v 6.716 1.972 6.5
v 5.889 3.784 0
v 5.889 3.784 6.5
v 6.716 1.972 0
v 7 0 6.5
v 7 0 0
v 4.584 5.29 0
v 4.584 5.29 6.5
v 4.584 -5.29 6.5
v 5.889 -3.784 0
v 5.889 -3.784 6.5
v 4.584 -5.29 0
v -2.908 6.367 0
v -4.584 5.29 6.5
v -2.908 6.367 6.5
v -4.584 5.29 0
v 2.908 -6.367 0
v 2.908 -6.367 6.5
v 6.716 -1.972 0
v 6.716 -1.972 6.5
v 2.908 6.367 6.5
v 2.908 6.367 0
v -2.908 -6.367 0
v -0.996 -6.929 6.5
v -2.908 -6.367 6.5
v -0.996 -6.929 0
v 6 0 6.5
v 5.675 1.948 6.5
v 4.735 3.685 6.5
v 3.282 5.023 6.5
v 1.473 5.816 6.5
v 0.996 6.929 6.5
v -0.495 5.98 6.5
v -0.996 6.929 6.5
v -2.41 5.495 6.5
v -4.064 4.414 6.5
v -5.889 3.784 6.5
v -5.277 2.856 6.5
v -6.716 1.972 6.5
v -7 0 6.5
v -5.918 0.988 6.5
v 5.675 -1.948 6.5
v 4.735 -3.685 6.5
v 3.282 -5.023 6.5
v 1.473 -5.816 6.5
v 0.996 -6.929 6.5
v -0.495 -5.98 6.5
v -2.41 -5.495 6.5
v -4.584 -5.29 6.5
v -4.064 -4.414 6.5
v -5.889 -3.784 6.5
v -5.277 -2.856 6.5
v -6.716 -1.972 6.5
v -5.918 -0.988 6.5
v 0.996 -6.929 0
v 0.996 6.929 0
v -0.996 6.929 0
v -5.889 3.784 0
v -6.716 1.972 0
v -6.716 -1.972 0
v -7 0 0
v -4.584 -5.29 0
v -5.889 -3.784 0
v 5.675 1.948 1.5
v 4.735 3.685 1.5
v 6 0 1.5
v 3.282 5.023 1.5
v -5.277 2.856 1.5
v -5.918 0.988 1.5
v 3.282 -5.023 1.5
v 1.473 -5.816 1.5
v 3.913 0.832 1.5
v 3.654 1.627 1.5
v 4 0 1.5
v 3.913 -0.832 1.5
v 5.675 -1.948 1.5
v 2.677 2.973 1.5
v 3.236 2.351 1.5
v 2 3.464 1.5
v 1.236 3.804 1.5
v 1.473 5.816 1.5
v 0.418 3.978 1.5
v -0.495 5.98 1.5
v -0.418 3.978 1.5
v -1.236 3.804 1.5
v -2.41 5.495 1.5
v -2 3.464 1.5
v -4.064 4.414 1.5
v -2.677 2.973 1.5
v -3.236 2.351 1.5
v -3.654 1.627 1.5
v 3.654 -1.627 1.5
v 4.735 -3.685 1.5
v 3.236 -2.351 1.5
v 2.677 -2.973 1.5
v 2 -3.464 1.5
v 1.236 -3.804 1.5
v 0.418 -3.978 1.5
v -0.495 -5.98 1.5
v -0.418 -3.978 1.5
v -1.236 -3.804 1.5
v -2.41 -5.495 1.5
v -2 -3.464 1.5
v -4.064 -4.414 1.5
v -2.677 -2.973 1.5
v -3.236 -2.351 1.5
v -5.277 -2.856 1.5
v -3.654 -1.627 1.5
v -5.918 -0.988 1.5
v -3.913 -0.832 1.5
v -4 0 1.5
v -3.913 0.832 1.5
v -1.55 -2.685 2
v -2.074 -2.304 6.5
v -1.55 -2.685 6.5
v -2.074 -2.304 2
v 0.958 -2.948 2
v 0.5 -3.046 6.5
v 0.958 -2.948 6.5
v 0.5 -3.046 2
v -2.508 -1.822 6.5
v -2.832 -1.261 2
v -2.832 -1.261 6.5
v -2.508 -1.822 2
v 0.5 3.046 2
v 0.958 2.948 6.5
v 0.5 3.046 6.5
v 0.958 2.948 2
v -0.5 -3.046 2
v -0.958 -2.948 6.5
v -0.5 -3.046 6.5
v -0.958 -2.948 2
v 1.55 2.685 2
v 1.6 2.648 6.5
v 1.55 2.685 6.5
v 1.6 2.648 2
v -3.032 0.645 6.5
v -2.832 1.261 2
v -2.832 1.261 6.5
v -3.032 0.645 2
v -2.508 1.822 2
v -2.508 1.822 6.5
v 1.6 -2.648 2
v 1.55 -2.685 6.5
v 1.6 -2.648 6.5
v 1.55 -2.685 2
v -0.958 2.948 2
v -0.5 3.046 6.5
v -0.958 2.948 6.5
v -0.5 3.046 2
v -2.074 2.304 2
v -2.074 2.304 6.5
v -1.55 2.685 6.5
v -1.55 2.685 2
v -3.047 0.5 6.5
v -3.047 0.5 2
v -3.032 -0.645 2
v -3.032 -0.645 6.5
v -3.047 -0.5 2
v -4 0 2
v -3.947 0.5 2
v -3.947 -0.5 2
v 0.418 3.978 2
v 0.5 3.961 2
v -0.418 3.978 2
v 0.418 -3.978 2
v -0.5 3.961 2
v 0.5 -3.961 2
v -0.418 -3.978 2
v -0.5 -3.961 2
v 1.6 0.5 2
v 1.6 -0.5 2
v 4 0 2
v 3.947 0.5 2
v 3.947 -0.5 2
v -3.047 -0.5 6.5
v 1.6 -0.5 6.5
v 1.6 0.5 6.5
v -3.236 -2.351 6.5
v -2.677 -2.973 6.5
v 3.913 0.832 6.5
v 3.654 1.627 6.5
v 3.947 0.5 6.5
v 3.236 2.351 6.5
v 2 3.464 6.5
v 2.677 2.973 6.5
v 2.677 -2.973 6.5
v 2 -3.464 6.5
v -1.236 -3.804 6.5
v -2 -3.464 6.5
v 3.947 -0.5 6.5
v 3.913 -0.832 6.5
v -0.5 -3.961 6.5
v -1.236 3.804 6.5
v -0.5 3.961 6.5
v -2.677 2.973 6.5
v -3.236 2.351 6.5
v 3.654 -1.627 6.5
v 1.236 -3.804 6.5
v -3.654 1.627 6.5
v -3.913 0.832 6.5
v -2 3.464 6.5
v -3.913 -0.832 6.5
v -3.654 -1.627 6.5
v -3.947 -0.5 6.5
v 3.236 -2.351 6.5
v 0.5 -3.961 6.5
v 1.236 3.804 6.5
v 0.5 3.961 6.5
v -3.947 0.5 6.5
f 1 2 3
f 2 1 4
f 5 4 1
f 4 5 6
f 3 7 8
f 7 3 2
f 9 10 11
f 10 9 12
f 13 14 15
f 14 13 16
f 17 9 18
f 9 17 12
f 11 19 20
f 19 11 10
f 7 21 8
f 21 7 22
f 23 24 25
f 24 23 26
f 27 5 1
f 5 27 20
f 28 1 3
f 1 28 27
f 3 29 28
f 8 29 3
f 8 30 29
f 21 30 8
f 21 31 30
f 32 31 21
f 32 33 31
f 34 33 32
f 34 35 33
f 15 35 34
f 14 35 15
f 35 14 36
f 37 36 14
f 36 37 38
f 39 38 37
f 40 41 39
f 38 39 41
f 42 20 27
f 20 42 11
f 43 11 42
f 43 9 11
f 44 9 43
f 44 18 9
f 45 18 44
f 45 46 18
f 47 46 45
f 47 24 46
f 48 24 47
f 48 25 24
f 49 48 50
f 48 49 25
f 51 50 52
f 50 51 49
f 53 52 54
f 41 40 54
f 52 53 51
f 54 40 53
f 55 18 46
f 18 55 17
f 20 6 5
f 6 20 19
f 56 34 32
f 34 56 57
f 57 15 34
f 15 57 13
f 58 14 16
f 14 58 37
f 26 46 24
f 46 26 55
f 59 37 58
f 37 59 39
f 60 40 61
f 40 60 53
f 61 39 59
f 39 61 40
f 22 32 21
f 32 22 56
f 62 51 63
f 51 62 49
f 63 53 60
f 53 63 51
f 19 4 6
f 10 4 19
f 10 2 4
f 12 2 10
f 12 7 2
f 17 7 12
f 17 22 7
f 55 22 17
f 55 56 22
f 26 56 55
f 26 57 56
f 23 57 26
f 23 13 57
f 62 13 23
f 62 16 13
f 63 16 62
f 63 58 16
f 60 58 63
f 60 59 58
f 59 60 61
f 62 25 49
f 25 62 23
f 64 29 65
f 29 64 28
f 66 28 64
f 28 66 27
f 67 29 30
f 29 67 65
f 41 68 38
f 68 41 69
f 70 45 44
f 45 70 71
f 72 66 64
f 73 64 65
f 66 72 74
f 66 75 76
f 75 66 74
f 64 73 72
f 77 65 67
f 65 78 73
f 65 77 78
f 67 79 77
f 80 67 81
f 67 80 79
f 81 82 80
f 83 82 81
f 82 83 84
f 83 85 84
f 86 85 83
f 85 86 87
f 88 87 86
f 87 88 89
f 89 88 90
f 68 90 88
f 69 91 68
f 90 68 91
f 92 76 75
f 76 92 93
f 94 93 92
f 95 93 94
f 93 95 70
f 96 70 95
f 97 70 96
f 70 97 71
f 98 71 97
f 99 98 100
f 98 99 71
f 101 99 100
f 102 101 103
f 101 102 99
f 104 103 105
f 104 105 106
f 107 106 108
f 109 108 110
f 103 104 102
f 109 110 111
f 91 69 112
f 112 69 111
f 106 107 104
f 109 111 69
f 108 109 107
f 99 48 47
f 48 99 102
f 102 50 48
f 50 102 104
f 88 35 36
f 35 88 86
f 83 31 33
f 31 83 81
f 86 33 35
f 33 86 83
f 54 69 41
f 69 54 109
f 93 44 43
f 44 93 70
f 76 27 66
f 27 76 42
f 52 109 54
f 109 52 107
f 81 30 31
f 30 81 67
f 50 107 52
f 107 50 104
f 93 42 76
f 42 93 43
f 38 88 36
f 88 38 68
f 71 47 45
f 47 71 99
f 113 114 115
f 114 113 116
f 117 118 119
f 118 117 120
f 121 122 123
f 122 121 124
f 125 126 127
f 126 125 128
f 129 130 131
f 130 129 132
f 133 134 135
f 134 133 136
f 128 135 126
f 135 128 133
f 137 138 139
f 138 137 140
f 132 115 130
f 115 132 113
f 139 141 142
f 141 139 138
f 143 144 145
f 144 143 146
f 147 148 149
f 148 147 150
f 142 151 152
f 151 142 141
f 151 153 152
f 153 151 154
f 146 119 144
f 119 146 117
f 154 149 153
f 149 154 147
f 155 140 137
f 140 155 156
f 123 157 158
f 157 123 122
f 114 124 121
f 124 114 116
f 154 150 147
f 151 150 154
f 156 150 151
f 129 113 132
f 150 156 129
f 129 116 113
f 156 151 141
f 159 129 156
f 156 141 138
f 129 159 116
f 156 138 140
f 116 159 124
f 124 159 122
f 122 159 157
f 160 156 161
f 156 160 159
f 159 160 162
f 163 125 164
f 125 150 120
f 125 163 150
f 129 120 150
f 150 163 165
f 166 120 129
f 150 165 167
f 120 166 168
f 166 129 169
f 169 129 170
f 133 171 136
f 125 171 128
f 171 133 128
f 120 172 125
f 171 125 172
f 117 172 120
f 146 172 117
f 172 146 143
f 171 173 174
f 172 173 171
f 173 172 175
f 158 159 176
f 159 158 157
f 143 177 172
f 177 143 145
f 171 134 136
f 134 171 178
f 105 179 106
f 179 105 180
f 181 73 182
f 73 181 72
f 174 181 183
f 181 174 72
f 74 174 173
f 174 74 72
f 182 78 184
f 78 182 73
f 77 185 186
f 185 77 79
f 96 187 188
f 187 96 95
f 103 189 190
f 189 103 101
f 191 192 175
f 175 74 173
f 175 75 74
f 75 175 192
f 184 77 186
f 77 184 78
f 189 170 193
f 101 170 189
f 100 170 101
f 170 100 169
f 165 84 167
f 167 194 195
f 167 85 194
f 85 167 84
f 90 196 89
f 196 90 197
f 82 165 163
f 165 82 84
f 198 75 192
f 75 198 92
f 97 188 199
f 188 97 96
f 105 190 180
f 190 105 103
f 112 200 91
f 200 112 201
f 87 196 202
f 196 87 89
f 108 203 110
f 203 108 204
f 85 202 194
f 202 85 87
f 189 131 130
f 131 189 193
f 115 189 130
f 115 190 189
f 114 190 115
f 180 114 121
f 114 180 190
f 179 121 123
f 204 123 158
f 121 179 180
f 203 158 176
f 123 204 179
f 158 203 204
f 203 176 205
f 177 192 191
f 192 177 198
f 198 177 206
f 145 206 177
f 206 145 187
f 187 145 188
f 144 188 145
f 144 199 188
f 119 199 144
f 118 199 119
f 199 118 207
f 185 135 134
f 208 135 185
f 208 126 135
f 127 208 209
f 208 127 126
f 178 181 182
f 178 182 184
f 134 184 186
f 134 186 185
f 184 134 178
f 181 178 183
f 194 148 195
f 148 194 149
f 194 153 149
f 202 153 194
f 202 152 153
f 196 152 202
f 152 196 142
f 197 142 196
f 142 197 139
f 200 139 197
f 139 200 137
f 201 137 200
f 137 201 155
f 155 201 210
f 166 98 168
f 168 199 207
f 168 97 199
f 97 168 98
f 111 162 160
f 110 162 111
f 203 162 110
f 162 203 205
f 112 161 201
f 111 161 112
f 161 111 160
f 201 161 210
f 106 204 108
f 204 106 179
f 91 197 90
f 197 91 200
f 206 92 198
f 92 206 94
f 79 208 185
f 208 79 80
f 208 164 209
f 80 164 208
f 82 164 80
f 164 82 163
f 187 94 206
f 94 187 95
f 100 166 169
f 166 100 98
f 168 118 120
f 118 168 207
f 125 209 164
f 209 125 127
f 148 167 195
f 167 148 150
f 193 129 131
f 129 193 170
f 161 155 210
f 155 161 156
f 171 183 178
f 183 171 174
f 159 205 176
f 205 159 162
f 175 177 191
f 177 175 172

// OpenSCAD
module cap() {
    difference() {
        cylinder(6-0.5, 4, 4, $fn=30);
        translate([0, 0, 1]) difference() {
            cylinder(6, 3+0.1, 3+0.1, $fn=30);
            translate([1.5+0.1, -4, 0]) cube([3, 8, 6]);
        }
        translate([-0.5, -5, 1]) cube([1, 10, 10]);
        rotate([0, 0, 90]) translate([-0.5, -5, 1]) cube([1, 10, 10]);
    }
}

union() {
    difference() {
        cylinder(6.5, 7, 7);
        translate([0, 0, 1.5]) cylinder(8, 6, 6);
    }
    translate([0, 0, 1]) cap();
}
